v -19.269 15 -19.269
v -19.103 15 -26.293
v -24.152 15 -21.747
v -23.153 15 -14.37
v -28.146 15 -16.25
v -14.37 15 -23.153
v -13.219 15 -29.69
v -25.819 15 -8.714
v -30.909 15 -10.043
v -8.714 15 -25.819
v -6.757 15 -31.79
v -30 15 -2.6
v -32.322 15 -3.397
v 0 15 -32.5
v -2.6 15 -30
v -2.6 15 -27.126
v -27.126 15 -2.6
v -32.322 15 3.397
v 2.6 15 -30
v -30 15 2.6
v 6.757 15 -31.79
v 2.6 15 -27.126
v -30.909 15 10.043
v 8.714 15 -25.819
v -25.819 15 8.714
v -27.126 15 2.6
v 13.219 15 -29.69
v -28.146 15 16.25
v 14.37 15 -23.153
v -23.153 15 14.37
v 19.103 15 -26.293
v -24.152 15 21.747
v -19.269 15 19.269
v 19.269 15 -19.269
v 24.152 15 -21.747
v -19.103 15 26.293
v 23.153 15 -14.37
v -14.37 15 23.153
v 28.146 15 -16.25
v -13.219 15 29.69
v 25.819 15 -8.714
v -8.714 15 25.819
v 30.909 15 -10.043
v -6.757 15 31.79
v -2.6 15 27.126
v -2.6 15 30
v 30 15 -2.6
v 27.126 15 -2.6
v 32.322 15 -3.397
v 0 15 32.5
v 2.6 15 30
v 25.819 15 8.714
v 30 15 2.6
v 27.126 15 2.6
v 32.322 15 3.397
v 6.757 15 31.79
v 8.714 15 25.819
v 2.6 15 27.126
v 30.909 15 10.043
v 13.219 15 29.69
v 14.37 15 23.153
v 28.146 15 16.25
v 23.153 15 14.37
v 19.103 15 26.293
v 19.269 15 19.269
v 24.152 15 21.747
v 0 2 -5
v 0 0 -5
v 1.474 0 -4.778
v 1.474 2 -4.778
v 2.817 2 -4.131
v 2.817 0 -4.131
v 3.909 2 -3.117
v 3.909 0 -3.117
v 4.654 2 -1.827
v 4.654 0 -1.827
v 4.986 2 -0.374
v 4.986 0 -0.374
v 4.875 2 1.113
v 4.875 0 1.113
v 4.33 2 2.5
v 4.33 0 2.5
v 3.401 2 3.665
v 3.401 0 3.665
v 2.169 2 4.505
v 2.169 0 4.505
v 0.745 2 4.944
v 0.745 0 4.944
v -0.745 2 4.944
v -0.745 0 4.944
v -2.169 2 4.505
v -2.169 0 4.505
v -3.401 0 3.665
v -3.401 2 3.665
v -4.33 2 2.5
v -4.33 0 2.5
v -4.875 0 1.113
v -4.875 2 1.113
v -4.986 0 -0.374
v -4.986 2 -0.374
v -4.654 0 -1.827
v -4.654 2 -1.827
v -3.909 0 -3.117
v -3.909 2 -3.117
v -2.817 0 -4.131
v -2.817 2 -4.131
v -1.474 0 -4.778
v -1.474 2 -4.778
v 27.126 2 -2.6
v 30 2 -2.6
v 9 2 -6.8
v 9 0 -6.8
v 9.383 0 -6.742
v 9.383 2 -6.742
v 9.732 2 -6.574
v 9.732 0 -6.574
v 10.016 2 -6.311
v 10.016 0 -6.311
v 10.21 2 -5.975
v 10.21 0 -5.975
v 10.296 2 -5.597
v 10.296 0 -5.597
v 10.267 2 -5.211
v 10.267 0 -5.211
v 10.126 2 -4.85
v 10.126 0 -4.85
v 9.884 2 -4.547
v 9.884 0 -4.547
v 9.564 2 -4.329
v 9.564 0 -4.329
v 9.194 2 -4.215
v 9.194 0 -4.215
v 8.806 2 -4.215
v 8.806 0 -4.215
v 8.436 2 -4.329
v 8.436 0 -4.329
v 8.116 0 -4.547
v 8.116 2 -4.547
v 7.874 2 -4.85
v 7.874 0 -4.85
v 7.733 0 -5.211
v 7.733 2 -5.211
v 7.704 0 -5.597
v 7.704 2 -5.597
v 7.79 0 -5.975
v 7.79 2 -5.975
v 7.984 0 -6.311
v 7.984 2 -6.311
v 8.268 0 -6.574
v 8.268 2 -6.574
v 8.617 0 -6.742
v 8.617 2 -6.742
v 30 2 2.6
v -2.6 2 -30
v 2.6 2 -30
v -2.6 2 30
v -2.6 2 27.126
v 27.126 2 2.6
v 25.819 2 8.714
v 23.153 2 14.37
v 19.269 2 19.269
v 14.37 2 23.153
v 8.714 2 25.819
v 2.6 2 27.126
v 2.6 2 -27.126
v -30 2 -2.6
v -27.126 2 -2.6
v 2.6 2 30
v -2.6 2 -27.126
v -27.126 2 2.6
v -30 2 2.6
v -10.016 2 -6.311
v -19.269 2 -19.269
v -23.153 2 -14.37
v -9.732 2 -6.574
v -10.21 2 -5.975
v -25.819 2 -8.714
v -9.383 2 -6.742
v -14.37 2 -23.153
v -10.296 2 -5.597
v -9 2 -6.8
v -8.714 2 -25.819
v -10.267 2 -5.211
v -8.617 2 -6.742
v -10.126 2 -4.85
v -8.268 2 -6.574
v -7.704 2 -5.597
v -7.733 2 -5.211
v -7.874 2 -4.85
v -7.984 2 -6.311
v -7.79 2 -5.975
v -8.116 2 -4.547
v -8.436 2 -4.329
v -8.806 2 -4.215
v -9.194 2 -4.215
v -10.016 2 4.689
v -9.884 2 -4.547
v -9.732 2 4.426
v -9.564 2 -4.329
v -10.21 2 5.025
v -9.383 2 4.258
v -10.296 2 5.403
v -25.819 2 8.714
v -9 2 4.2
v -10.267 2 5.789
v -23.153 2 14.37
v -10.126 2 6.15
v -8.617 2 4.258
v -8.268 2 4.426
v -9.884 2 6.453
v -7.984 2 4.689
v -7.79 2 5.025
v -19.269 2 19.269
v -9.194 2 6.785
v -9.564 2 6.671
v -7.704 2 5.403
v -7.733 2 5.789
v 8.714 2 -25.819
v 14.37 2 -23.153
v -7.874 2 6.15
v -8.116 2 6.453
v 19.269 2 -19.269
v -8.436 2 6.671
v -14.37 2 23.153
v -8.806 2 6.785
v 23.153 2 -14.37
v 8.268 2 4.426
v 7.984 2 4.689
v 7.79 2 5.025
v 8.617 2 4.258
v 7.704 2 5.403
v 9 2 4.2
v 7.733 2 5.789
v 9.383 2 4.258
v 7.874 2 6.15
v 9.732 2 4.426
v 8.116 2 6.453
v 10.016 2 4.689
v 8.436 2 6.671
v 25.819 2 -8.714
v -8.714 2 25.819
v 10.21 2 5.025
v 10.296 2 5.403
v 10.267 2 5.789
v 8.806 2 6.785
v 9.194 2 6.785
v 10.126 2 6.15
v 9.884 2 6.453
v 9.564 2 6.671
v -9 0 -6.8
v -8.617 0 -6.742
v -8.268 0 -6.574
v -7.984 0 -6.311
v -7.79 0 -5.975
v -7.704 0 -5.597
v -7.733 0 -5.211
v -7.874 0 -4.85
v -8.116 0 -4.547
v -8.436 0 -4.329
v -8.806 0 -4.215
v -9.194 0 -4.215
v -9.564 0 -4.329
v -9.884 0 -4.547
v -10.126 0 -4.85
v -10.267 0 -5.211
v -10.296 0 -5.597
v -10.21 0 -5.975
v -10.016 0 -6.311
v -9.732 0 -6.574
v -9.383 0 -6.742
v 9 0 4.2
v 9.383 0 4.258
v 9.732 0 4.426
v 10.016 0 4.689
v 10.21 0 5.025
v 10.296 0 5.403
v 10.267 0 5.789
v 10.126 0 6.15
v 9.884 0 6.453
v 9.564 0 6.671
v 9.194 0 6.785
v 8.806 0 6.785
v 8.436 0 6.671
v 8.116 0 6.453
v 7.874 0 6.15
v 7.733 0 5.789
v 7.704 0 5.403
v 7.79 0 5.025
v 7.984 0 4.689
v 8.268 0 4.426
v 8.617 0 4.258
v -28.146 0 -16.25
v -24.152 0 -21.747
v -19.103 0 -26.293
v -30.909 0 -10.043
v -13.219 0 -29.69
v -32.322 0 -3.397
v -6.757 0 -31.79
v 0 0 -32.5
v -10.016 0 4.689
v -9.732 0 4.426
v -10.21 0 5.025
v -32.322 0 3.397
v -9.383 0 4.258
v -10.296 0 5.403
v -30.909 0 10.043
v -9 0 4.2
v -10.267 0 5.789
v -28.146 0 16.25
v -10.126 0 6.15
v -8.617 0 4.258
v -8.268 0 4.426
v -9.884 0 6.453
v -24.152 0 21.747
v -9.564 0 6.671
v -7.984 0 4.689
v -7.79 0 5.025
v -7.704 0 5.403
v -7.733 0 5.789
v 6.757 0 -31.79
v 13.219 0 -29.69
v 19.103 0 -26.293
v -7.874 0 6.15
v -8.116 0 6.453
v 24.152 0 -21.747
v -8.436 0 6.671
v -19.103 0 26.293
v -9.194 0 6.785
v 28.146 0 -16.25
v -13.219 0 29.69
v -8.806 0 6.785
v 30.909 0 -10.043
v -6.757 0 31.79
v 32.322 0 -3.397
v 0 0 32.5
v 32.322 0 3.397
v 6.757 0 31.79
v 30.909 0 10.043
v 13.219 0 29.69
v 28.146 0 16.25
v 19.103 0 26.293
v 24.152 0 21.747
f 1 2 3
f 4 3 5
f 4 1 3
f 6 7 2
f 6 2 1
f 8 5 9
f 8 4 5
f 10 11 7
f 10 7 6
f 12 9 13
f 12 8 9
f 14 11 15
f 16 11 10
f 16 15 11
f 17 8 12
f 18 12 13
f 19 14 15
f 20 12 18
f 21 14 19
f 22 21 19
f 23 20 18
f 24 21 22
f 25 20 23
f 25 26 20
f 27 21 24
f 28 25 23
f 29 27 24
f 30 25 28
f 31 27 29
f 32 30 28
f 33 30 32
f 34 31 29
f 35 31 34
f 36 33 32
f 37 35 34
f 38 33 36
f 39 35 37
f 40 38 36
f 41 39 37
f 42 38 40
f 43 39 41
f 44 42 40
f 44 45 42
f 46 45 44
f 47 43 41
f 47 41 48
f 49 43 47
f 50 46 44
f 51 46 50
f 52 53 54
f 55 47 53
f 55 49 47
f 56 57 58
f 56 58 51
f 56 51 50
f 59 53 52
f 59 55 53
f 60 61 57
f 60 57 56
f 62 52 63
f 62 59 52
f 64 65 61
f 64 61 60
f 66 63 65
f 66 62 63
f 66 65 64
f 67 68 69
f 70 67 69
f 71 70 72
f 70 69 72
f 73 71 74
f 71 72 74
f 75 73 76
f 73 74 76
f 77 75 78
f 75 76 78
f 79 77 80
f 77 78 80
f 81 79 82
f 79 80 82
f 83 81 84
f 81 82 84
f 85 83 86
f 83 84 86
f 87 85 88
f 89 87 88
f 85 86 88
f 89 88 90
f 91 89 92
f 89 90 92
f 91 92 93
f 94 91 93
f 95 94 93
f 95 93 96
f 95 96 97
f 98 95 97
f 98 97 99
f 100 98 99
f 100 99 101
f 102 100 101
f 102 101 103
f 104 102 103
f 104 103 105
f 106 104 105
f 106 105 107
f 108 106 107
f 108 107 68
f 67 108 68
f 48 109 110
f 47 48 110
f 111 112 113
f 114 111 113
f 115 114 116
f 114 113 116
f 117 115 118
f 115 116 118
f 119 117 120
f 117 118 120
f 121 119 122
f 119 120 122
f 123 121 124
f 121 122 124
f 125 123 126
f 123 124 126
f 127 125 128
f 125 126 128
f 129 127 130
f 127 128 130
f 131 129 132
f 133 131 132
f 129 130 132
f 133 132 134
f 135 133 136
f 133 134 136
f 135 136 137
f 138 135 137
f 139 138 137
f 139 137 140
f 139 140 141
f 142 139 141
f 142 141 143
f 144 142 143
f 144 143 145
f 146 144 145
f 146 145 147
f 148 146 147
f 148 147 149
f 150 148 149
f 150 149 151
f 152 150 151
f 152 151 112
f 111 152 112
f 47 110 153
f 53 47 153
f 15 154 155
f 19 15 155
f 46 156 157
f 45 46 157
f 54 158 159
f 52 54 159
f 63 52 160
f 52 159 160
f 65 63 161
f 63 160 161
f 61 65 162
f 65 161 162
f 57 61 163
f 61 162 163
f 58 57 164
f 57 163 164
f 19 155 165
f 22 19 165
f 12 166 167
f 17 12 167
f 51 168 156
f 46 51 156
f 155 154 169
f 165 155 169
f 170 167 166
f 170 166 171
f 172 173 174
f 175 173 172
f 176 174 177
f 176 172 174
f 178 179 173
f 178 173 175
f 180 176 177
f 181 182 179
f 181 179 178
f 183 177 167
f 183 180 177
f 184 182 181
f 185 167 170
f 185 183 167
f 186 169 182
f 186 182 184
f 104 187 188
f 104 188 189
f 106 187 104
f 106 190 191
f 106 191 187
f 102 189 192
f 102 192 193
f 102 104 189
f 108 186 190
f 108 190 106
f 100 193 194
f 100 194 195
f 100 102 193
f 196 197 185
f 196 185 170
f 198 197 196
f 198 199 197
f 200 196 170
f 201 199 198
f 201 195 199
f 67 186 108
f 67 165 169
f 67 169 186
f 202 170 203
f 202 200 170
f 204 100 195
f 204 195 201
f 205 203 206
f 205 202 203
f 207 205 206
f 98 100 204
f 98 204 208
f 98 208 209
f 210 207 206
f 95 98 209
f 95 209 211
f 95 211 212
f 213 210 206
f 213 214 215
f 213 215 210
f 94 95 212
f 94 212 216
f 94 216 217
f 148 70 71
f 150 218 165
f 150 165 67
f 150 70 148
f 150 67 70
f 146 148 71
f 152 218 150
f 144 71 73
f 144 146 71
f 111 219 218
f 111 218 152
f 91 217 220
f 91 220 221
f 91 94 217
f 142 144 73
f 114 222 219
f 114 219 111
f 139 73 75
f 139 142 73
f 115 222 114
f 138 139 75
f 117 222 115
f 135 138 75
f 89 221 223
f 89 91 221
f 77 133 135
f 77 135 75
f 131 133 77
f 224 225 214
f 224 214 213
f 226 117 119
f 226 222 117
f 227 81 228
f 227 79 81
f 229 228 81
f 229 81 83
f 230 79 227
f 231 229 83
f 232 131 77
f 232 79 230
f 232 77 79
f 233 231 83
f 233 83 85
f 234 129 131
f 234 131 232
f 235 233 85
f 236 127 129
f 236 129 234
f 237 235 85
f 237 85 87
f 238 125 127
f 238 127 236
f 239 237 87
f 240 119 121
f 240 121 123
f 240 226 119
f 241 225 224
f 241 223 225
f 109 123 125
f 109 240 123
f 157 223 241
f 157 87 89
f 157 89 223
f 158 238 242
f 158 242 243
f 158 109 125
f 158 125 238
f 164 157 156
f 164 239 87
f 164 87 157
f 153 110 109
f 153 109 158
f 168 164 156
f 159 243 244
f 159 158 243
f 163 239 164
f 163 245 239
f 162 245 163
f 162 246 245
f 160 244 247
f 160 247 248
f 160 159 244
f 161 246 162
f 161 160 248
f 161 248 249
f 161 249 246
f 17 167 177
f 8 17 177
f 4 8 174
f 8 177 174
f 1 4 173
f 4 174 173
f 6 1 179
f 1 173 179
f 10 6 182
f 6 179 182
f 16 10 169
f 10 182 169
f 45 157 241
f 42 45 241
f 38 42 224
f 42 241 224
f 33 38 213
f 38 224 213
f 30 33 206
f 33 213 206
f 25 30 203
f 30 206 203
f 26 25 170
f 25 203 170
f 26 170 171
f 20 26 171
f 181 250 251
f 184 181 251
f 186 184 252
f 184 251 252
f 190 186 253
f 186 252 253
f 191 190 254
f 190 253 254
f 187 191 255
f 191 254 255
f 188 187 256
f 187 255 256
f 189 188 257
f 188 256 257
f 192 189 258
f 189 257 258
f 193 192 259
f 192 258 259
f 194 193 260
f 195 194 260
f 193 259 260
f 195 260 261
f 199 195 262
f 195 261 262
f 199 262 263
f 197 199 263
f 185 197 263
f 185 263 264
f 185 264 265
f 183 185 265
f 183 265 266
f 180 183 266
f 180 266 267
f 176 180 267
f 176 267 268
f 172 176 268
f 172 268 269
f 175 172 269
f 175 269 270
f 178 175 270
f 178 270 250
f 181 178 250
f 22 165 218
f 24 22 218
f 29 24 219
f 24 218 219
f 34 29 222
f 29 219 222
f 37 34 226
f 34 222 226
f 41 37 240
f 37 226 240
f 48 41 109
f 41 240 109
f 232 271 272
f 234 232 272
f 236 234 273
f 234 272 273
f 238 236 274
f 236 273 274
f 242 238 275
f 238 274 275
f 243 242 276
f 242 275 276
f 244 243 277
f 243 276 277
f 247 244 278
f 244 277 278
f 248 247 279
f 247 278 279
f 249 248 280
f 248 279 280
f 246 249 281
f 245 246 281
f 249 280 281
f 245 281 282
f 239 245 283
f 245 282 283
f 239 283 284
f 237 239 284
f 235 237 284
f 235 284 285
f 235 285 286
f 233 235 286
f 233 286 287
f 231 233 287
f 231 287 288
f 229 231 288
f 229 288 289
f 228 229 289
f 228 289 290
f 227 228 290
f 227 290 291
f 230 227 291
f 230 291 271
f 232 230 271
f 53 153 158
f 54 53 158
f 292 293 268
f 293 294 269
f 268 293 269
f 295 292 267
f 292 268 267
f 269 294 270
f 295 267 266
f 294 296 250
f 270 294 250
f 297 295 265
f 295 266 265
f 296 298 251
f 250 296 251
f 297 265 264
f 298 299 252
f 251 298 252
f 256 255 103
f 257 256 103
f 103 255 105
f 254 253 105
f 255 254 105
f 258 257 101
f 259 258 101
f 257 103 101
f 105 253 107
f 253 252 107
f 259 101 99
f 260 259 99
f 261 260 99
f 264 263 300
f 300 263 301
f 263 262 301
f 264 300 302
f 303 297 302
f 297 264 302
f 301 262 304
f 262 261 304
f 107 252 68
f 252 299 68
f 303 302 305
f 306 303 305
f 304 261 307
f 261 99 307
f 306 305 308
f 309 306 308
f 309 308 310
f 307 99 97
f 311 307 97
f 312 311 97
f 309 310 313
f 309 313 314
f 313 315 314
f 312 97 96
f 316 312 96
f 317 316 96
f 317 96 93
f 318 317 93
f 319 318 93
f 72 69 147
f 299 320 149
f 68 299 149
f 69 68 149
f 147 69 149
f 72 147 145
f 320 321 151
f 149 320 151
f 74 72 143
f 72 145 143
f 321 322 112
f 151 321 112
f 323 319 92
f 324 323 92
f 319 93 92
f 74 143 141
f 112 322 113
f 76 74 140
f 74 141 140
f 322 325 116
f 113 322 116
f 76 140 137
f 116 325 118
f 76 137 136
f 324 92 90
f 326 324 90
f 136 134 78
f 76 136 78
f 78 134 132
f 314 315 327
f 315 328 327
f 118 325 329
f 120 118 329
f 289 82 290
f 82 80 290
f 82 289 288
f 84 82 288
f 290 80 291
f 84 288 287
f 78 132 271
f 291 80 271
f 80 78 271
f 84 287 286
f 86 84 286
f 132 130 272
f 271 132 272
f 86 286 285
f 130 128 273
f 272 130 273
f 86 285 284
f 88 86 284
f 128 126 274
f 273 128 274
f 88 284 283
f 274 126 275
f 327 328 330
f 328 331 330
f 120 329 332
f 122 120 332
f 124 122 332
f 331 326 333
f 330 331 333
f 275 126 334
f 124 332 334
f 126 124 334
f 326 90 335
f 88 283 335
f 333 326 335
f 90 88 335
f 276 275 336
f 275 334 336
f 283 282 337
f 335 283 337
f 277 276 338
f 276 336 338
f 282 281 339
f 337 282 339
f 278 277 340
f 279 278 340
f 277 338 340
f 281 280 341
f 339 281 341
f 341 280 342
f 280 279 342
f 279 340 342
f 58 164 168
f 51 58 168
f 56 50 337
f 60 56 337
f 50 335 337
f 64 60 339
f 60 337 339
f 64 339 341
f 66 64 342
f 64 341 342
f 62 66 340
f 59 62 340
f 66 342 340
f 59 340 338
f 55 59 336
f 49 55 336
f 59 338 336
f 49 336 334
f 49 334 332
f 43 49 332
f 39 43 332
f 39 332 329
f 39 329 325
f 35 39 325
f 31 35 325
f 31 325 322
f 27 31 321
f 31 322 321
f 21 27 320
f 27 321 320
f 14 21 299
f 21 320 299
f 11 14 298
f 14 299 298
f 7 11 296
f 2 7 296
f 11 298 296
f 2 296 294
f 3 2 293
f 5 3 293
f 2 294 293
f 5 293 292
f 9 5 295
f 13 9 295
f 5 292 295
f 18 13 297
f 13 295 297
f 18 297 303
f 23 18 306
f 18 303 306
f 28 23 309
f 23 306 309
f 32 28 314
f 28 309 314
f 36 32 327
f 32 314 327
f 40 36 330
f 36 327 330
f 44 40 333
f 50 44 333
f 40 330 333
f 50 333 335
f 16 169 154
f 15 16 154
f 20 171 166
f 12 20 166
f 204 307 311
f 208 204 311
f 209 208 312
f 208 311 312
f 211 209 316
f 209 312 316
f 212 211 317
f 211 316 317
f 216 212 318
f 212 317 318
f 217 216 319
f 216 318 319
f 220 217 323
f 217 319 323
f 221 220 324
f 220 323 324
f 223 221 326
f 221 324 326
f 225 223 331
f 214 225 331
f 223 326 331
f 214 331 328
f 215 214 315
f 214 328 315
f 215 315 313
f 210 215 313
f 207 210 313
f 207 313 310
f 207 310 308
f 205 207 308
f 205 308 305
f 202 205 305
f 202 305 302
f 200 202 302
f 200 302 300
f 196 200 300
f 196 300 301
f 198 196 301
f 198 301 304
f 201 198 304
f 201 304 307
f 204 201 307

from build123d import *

# Parameters (mm, degrees)
SKETCH1_R           = 32.5
BOSS_EXTRUDE1_DEPTH = 2
SKETCH2_R           = 32.5
BOSS_EXTRUDE2_DEPTH = 13
CUT_EXTRUDE2_REACH  = 50.348
SKETCH3_R           = 5
CUT_EXTRUDE3_REACH  = 50.348
SKETCH5_R           = 1.3


with BuildPart() as part:
    # Sketch1 → Boss-Extrude1 (new body)
    with BuildSketch(Plane(origin=(0, 0, 0), x_dir=(1, 0, 0), z_dir=(0, 1, 0))):
        with Locations(Location((0, 0, 0), (0, 0, 270))):
            Circle(SKETCH1_R)
    extrude(amount=BOSS_EXTRUDE1_DEPTH)

    # Sketch2 → Boss-Extrude2 (add)
    with BuildSketch(Plane(origin=(0, 2, 0), x_dir=(1, 0, 0), z_dir=(0, 1, 0))):
        with Locations(Location((0, 0, 0), (0, 0, 270))):
            Circle(SKETCH2_R)
        with BuildLine():
            Line((2.6, -27.125679715), (2.6, -30))
            Line((2.6, -30), (-2.6, -30))
            Line((-2.6, -30), (-2.6, -27.125679715))
            ThreePointArc((-2.6, -27.125679715), (-19.268659787, -19.268659787), (-27.125679715, -2.6))
            Line((-27.125679715, -2.6), (-30, -2.6))
            Line((-30, -2.6), (-30, 2.6))
            Line((-30, 2.6), (-27.125679715, 2.6))
            ThreePointArc((-27.125679715, 2.6), (-19.268659787, 19.268659787), (-2.6, 27.125679715))
            Line((-2.6, 27.125679715), (-2.6, 30))
            Line((-2.6, 30), (2.6, 30))
            Line((2.6, 30), (2.6, 27.125679715))
            ThreePointArc((2.6, 27.125679715), (19.268659787, 19.268659787), (27.125679715, 2.6))
            Line((27.125679715, 2.6), (30, 2.6))
            Line((30, 2.6), (30, -2.6))
            Line((30, -2.6), (27.125679715, -2.6))
            ThreePointArc((27.125679715, -2.6), (19.268659787, -19.268659787), (2.6, -27.125679715))
        make_face(mode=Mode.SUBTRACT)
    extrude(amount=BOSS_EXTRUDE2_DEPTH)

    # Sketch3 → Cut-Extrude2 (cut, up to next)
    with BuildSketch(Plane.XZ, mode=Mode.PRIVATE) as cut_extrude2_sk1:
        with Locations(Location((0, 0, 0), (0, 0, 270))):
            Circle(SKETCH3_R)
    cut_extrude2_tool1 = extrude(cut_extrude2_sk1.sketch, amount=-CUT_EXTRUDE2_REACH, mode=Mode.PRIVATE) & part.part
    add(cut_extrude2_tool1.solids().sort_by_distance((0, 0, 0))[0], mode=Mode.SUBTRACT)

    # Sketch5 → Cut-Extrude3 (cut, up to next)
    with BuildSketch(Plane.XZ, mode=Mode.PRIVATE) as cut_extrude3_sk1:
        with Locations(Location((9, 5.5, 0), (0, 0, 270))):
            Circle(SKETCH5_R)
    cut_extrude3_tool1 = extrude(cut_extrude3_sk1.sketch, amount=-CUT_EXTRUDE3_REACH, mode=Mode.PRIVATE) & part.part
    # Sketch5 → Cut-Extrude3 (cut, up to next)
    with BuildSketch(Plane.XZ, mode=Mode.PRIVATE) as cut_extrude3_sk2:
        with Locations(Location((9, -5.5, 0), (0, 0, 270))):
            Circle(SKETCH5_R)
    cut_extrude3_tool2 = extrude(cut_extrude3_sk2.sketch, amount=-CUT_EXTRUDE3_REACH, mode=Mode.PRIVATE) & part.part
    # Sketch5 → Cut-Extrude3 (cut, up to next)
    with BuildSketch(Plane.XZ, mode=Mode.PRIVATE) as cut_extrude3_sk3:
        with Locations(Location((-9, -5.5, 0), (0, 0, 270))):
            Circle(SKETCH5_R)
    cut_extrude3_tool3 = extrude(cut_extrude3_sk3.sketch, amount=-CUT_EXTRUDE3_REACH, mode=Mode.PRIVATE) & part.part
    # Sketch5 → Cut-Extrude3 (cut, up to next)
    with BuildSketch(Plane.XZ, mode=Mode.PRIVATE) as cut_extrude3_sk4:
        with Locations(Location((-9, 5.5, 0), (0, 0, 270))):
            Circle(SKETCH5_R)
    cut_extrude3_tool4 = extrude(cut_extrude3_sk4.sketch, amount=-CUT_EXTRUDE3_REACH, mode=Mode.PRIVATE) & part.part
    add(cut_extrude3_tool1.solids().sort_by_distance((9, 0, 5.5))[0], mode=Mode.SUBTRACT)
    add(cut_extrude3_tool2.solids().sort_by_distance((9, 0, -5.5))[0], mode=Mode.SUBTRACT)
    add(cut_extrude3_tool3.solids().sort_by_distance((-9, 0, -5.5))[0], mode=Mode.SUBTRACT)
    add(cut_extrude3_tool4.solids().sort_by_distance((-9, 0, 5.5))[0], mode=Mode.SUBTRACT)


solid = part.part
